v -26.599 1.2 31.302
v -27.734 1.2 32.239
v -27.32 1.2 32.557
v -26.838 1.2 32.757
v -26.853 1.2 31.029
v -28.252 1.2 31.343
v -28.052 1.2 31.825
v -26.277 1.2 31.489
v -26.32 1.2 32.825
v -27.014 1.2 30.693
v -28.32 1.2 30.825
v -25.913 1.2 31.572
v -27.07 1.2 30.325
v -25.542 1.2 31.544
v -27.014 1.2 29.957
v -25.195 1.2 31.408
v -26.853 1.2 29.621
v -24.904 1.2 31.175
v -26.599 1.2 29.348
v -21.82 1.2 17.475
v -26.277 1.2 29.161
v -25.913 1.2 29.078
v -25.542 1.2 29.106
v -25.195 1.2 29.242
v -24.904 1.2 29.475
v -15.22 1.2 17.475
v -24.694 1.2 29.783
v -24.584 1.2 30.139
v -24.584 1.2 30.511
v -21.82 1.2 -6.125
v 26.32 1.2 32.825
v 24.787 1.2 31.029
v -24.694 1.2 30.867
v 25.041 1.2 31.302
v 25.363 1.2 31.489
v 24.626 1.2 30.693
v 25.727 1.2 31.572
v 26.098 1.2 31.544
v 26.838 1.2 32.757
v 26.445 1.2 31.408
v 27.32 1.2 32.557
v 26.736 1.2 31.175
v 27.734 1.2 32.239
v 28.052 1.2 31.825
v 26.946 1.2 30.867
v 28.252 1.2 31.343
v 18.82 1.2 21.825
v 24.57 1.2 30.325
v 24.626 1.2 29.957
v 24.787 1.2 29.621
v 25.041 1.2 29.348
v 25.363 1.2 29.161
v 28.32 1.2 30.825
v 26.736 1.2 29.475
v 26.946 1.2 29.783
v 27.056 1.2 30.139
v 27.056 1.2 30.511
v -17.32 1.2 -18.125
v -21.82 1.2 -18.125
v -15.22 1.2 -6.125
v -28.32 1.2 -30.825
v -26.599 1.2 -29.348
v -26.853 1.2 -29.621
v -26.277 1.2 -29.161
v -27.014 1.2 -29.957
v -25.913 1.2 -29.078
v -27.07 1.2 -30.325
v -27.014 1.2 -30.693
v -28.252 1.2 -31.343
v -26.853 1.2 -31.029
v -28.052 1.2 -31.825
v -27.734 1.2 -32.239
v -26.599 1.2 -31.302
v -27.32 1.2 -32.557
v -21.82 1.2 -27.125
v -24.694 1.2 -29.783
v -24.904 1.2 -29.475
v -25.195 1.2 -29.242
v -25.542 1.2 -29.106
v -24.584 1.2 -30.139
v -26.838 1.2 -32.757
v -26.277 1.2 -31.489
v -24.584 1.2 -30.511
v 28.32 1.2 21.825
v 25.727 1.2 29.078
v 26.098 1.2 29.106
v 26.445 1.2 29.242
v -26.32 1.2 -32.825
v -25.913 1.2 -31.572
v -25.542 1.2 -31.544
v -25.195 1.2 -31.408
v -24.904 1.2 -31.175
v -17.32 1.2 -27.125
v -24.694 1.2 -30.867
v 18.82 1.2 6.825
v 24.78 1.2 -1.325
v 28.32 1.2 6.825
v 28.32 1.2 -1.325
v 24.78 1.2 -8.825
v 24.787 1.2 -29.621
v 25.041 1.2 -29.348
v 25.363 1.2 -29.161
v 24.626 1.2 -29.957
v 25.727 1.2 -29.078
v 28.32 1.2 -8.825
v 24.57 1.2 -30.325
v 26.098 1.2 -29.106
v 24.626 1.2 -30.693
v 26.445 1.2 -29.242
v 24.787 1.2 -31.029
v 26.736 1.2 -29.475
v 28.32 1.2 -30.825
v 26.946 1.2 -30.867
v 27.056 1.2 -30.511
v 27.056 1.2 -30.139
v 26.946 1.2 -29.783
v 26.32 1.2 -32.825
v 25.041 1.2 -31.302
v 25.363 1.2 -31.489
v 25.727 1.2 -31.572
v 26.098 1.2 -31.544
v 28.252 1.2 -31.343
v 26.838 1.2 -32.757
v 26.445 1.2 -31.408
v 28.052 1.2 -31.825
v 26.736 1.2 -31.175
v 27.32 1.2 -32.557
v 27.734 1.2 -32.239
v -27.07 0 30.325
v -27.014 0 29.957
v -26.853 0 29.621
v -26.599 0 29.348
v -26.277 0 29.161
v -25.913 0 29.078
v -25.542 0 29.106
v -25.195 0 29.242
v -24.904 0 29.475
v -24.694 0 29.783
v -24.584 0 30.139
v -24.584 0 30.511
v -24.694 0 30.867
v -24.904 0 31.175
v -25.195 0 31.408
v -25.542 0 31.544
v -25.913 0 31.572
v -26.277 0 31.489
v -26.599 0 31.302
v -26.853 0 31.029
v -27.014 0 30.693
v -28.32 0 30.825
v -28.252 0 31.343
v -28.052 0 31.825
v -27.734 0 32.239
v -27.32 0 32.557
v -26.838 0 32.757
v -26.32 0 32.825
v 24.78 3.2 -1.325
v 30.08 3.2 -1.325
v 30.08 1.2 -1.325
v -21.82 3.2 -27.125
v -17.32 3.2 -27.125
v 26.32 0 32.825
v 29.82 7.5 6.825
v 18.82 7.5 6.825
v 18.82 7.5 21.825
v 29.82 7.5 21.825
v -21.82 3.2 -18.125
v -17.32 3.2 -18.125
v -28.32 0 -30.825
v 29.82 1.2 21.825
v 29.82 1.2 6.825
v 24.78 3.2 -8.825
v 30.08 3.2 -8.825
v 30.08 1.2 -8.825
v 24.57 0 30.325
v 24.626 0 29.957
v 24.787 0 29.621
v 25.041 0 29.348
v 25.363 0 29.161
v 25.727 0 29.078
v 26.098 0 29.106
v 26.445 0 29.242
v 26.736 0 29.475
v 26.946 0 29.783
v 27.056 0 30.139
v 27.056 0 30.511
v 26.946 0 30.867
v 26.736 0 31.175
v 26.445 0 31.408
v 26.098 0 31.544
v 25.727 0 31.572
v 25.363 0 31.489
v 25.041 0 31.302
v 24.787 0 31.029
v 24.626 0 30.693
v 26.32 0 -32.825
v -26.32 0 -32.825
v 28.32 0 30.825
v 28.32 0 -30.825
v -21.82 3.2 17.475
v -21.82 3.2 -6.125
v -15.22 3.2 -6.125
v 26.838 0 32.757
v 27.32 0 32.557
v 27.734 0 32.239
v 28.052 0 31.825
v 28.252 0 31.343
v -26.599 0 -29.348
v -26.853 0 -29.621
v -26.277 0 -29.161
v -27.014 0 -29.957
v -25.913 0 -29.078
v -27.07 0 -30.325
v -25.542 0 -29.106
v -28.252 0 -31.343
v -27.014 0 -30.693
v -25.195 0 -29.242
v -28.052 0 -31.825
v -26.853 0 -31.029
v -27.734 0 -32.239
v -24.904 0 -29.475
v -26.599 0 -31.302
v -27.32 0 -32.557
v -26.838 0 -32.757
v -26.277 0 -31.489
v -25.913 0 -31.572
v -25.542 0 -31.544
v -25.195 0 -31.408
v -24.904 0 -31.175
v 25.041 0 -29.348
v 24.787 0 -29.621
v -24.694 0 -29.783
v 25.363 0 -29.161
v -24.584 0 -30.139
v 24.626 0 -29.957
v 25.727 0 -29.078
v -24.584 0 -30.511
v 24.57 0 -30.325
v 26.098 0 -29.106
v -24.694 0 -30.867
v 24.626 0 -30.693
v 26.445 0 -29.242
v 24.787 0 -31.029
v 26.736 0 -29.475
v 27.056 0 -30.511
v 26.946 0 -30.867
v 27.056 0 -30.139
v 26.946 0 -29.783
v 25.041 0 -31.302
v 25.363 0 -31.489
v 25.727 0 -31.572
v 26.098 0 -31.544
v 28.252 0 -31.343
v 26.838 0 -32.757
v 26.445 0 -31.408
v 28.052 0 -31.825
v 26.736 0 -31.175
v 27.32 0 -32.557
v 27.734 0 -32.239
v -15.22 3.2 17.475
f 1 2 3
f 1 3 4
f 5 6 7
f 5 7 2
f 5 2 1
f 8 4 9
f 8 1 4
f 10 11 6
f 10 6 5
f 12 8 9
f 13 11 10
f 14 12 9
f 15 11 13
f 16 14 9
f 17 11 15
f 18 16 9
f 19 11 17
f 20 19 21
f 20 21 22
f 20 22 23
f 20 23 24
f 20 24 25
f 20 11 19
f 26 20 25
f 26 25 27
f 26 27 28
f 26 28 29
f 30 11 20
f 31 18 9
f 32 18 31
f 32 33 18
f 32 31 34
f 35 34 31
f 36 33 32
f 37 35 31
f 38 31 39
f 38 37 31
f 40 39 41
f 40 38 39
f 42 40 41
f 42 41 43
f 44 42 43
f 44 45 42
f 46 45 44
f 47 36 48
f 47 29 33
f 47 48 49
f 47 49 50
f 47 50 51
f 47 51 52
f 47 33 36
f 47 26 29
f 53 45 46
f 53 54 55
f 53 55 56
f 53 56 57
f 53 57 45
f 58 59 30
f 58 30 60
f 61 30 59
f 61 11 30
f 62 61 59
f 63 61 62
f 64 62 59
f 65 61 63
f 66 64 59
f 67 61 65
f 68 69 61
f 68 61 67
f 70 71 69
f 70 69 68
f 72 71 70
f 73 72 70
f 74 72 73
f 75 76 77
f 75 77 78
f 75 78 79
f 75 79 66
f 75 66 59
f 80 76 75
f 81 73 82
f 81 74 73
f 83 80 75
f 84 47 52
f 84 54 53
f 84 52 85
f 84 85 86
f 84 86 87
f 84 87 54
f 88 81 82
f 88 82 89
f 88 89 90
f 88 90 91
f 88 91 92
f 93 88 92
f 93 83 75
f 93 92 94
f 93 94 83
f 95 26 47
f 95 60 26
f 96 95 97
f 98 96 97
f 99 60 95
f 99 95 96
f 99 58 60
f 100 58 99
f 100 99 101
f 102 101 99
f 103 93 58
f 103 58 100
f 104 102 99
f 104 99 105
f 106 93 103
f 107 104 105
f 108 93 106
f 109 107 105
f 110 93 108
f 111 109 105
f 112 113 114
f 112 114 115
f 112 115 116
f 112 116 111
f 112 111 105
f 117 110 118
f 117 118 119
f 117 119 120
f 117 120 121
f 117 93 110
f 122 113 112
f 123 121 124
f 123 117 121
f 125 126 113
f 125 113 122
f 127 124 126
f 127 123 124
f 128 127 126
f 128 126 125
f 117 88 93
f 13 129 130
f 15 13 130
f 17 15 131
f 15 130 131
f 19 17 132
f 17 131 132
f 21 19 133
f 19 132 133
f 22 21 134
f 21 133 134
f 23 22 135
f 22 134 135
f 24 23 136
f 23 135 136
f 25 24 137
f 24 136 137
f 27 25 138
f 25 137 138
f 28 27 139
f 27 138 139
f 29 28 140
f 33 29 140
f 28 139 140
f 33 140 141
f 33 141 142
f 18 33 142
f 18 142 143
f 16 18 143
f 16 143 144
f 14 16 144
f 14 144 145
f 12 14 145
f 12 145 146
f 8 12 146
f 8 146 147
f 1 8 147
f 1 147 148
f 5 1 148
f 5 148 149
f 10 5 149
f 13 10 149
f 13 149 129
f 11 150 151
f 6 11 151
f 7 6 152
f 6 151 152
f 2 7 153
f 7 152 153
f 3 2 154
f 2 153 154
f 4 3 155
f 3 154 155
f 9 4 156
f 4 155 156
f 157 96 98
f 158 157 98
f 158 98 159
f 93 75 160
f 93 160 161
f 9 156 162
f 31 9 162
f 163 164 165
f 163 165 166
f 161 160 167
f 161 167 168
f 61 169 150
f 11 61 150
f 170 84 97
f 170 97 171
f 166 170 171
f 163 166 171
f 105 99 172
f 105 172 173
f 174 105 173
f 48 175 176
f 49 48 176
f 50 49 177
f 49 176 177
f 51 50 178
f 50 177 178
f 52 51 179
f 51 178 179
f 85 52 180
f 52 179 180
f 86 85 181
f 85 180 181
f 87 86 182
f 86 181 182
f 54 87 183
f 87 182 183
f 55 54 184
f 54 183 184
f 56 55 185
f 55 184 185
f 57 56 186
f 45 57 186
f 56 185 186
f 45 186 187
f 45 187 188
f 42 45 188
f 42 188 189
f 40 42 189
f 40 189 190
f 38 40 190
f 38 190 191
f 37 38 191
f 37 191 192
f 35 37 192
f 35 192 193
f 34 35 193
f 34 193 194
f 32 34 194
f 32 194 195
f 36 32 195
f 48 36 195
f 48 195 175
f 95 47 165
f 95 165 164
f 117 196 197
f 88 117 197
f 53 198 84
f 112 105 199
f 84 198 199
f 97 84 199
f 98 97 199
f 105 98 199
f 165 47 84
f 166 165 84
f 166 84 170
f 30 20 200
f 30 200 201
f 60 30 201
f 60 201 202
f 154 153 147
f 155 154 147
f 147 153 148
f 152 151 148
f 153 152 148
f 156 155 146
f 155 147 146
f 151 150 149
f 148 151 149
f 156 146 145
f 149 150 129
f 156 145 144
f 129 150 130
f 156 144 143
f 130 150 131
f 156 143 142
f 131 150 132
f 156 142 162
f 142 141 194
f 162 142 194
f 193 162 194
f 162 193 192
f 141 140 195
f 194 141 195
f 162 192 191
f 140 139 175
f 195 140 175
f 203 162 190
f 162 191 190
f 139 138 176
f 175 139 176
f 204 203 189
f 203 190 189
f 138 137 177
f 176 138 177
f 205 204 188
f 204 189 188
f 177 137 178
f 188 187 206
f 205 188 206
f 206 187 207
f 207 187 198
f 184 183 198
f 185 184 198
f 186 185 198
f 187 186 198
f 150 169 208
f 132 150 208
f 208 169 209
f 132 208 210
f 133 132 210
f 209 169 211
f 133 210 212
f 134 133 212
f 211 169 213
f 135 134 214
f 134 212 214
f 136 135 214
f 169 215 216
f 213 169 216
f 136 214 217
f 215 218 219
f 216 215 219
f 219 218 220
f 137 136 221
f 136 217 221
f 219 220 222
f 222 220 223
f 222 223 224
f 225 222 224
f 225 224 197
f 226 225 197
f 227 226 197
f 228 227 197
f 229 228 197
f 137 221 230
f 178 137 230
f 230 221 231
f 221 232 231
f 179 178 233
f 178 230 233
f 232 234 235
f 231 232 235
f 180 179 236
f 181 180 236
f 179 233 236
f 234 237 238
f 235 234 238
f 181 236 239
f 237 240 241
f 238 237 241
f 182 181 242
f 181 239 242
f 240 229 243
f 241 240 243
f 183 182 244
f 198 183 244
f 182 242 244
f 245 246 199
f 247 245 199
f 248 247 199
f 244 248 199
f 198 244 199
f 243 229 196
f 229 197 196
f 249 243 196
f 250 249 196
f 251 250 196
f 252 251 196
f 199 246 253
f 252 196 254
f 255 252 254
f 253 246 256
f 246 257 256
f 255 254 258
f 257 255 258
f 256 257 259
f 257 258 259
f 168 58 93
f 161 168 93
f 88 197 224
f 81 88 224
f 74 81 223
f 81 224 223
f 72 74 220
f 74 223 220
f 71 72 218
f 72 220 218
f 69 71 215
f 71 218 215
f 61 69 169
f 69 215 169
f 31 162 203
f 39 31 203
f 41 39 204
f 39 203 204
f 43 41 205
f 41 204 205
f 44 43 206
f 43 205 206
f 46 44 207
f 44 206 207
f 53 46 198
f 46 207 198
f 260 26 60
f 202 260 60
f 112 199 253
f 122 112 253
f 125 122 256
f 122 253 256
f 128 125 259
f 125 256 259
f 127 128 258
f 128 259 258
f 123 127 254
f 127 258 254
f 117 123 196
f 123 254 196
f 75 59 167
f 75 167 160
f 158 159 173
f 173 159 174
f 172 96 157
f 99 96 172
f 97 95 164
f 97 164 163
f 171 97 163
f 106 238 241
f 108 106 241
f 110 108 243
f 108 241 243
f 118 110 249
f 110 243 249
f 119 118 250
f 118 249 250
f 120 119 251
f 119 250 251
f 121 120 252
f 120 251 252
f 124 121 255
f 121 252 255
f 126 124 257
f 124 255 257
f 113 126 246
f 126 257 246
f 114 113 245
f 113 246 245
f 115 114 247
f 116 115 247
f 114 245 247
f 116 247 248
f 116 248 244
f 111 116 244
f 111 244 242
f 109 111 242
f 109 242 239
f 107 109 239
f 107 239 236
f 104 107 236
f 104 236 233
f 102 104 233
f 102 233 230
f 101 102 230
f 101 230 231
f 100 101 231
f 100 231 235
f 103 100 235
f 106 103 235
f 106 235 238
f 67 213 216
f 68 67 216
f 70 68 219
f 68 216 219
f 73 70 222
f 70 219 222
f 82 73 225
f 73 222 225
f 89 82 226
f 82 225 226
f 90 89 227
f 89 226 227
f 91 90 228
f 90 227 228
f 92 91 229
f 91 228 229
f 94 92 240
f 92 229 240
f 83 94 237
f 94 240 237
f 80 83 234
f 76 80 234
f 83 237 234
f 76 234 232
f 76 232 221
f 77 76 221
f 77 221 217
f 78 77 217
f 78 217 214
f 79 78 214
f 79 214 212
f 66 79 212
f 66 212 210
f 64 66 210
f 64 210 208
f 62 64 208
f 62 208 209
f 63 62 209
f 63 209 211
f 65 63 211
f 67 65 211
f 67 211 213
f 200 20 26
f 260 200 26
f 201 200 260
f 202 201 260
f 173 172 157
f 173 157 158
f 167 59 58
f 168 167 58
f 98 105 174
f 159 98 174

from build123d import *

# Parameters (mm, degrees)
EXTRUDE_1_DEPTH = 1.2
MM_1_D          = 2.5
SKETCH_4_W      = 6.6
SKETCH_4_H      = 23.6
SKETCH_4_W_2    = 4.5
SKETCH_4_H_2    = 9
SKETCH_4_W_3    = 5.3
SKETCH_4_H_3    = 7.5
EXTRUDE_2_DEPTH = 2
SKETCH_5_W      = 11
SKETCH_5_H      = 15
EXTRUDE_3_DEPTH = 6.3


with BuildPart() as part:
    # 草图1 → 凸台-拉伸1 (new body)
    with BuildSketch(Plane(origin=(0, 0, 0), x_dir=(1, 0, 0), z_dir=(0, 1, 0))):
        with BuildLine():
            Line((-26.32, -32.825), (26.32, -32.825))
            ThreePointArc((26.32, -32.825), (27.734213562, -32.239213562), (28.32, -30.825))
            Line((28.32, -30.825), (28.32, 30.825))
            ThreePointArc((28.32, 30.825), (27.734213562, 32.239213562), (26.32, 32.825))
            Line((26.32, 32.825), (-26.32, 32.825))
            ThreePointArc((-26.32, 32.825), (-27.734213562, 32.239213562), (-28.32, 30.825))
            Line((-28.32, 30.825), (-28.32, -30.825))
            ThreePointArc((-28.32, -30.825), (-27.734213562, -32.239213562), (-26.32, -32.825))
        make_face()
    extrude(amount=EXTRUDE_1_DEPTH)

    # 大小mm 暗销孔1 (through all)
    with Locations(Plane(origin=(0, 1.2, 0), x_dir=(1, 0, 0), z_dir=(0, 1, 0))):
        with Locations((-25.82, 30.325), (-25.82, -30.325), (25.82, -30.325), (25.82, 30.325)):
            Hole(MM_1_D / 2)

    # 草图4 → 凸台-拉伸2 (add)
    with BuildSketch(Plane(origin=(0, 1.2, 0), x_dir=(1, 0, 0), z_dir=(0, 1, 0))):
        with Locations((-18.52, -5.675)):
            Rectangle(SKETCH_4_W, SKETCH_4_H)
        with Locations((-19.57, 22.625)):
            Rectangle(SKETCH_4_W_2, SKETCH_4_H_2)
        with Locations((27.43, 5.075)):
            Rectangle(SKETCH_4_W_3, SKETCH_4_H_3)
    extrude(amount=EXTRUDE_2_DEPTH)

    # 草图5 → 凸台-拉伸3 (add)
    with BuildSketch(Plane(origin=(0, 1.2, 0), x_dir=(1, 0, 0), z_dir=(0, 1, 0))):
        with Locations((24.32, -14.325)):
            Rectangle(SKETCH_5_W, SKETCH_5_H)
    extrude(amount=EXTRUDE_3_DEPTH)


solid = part.part
